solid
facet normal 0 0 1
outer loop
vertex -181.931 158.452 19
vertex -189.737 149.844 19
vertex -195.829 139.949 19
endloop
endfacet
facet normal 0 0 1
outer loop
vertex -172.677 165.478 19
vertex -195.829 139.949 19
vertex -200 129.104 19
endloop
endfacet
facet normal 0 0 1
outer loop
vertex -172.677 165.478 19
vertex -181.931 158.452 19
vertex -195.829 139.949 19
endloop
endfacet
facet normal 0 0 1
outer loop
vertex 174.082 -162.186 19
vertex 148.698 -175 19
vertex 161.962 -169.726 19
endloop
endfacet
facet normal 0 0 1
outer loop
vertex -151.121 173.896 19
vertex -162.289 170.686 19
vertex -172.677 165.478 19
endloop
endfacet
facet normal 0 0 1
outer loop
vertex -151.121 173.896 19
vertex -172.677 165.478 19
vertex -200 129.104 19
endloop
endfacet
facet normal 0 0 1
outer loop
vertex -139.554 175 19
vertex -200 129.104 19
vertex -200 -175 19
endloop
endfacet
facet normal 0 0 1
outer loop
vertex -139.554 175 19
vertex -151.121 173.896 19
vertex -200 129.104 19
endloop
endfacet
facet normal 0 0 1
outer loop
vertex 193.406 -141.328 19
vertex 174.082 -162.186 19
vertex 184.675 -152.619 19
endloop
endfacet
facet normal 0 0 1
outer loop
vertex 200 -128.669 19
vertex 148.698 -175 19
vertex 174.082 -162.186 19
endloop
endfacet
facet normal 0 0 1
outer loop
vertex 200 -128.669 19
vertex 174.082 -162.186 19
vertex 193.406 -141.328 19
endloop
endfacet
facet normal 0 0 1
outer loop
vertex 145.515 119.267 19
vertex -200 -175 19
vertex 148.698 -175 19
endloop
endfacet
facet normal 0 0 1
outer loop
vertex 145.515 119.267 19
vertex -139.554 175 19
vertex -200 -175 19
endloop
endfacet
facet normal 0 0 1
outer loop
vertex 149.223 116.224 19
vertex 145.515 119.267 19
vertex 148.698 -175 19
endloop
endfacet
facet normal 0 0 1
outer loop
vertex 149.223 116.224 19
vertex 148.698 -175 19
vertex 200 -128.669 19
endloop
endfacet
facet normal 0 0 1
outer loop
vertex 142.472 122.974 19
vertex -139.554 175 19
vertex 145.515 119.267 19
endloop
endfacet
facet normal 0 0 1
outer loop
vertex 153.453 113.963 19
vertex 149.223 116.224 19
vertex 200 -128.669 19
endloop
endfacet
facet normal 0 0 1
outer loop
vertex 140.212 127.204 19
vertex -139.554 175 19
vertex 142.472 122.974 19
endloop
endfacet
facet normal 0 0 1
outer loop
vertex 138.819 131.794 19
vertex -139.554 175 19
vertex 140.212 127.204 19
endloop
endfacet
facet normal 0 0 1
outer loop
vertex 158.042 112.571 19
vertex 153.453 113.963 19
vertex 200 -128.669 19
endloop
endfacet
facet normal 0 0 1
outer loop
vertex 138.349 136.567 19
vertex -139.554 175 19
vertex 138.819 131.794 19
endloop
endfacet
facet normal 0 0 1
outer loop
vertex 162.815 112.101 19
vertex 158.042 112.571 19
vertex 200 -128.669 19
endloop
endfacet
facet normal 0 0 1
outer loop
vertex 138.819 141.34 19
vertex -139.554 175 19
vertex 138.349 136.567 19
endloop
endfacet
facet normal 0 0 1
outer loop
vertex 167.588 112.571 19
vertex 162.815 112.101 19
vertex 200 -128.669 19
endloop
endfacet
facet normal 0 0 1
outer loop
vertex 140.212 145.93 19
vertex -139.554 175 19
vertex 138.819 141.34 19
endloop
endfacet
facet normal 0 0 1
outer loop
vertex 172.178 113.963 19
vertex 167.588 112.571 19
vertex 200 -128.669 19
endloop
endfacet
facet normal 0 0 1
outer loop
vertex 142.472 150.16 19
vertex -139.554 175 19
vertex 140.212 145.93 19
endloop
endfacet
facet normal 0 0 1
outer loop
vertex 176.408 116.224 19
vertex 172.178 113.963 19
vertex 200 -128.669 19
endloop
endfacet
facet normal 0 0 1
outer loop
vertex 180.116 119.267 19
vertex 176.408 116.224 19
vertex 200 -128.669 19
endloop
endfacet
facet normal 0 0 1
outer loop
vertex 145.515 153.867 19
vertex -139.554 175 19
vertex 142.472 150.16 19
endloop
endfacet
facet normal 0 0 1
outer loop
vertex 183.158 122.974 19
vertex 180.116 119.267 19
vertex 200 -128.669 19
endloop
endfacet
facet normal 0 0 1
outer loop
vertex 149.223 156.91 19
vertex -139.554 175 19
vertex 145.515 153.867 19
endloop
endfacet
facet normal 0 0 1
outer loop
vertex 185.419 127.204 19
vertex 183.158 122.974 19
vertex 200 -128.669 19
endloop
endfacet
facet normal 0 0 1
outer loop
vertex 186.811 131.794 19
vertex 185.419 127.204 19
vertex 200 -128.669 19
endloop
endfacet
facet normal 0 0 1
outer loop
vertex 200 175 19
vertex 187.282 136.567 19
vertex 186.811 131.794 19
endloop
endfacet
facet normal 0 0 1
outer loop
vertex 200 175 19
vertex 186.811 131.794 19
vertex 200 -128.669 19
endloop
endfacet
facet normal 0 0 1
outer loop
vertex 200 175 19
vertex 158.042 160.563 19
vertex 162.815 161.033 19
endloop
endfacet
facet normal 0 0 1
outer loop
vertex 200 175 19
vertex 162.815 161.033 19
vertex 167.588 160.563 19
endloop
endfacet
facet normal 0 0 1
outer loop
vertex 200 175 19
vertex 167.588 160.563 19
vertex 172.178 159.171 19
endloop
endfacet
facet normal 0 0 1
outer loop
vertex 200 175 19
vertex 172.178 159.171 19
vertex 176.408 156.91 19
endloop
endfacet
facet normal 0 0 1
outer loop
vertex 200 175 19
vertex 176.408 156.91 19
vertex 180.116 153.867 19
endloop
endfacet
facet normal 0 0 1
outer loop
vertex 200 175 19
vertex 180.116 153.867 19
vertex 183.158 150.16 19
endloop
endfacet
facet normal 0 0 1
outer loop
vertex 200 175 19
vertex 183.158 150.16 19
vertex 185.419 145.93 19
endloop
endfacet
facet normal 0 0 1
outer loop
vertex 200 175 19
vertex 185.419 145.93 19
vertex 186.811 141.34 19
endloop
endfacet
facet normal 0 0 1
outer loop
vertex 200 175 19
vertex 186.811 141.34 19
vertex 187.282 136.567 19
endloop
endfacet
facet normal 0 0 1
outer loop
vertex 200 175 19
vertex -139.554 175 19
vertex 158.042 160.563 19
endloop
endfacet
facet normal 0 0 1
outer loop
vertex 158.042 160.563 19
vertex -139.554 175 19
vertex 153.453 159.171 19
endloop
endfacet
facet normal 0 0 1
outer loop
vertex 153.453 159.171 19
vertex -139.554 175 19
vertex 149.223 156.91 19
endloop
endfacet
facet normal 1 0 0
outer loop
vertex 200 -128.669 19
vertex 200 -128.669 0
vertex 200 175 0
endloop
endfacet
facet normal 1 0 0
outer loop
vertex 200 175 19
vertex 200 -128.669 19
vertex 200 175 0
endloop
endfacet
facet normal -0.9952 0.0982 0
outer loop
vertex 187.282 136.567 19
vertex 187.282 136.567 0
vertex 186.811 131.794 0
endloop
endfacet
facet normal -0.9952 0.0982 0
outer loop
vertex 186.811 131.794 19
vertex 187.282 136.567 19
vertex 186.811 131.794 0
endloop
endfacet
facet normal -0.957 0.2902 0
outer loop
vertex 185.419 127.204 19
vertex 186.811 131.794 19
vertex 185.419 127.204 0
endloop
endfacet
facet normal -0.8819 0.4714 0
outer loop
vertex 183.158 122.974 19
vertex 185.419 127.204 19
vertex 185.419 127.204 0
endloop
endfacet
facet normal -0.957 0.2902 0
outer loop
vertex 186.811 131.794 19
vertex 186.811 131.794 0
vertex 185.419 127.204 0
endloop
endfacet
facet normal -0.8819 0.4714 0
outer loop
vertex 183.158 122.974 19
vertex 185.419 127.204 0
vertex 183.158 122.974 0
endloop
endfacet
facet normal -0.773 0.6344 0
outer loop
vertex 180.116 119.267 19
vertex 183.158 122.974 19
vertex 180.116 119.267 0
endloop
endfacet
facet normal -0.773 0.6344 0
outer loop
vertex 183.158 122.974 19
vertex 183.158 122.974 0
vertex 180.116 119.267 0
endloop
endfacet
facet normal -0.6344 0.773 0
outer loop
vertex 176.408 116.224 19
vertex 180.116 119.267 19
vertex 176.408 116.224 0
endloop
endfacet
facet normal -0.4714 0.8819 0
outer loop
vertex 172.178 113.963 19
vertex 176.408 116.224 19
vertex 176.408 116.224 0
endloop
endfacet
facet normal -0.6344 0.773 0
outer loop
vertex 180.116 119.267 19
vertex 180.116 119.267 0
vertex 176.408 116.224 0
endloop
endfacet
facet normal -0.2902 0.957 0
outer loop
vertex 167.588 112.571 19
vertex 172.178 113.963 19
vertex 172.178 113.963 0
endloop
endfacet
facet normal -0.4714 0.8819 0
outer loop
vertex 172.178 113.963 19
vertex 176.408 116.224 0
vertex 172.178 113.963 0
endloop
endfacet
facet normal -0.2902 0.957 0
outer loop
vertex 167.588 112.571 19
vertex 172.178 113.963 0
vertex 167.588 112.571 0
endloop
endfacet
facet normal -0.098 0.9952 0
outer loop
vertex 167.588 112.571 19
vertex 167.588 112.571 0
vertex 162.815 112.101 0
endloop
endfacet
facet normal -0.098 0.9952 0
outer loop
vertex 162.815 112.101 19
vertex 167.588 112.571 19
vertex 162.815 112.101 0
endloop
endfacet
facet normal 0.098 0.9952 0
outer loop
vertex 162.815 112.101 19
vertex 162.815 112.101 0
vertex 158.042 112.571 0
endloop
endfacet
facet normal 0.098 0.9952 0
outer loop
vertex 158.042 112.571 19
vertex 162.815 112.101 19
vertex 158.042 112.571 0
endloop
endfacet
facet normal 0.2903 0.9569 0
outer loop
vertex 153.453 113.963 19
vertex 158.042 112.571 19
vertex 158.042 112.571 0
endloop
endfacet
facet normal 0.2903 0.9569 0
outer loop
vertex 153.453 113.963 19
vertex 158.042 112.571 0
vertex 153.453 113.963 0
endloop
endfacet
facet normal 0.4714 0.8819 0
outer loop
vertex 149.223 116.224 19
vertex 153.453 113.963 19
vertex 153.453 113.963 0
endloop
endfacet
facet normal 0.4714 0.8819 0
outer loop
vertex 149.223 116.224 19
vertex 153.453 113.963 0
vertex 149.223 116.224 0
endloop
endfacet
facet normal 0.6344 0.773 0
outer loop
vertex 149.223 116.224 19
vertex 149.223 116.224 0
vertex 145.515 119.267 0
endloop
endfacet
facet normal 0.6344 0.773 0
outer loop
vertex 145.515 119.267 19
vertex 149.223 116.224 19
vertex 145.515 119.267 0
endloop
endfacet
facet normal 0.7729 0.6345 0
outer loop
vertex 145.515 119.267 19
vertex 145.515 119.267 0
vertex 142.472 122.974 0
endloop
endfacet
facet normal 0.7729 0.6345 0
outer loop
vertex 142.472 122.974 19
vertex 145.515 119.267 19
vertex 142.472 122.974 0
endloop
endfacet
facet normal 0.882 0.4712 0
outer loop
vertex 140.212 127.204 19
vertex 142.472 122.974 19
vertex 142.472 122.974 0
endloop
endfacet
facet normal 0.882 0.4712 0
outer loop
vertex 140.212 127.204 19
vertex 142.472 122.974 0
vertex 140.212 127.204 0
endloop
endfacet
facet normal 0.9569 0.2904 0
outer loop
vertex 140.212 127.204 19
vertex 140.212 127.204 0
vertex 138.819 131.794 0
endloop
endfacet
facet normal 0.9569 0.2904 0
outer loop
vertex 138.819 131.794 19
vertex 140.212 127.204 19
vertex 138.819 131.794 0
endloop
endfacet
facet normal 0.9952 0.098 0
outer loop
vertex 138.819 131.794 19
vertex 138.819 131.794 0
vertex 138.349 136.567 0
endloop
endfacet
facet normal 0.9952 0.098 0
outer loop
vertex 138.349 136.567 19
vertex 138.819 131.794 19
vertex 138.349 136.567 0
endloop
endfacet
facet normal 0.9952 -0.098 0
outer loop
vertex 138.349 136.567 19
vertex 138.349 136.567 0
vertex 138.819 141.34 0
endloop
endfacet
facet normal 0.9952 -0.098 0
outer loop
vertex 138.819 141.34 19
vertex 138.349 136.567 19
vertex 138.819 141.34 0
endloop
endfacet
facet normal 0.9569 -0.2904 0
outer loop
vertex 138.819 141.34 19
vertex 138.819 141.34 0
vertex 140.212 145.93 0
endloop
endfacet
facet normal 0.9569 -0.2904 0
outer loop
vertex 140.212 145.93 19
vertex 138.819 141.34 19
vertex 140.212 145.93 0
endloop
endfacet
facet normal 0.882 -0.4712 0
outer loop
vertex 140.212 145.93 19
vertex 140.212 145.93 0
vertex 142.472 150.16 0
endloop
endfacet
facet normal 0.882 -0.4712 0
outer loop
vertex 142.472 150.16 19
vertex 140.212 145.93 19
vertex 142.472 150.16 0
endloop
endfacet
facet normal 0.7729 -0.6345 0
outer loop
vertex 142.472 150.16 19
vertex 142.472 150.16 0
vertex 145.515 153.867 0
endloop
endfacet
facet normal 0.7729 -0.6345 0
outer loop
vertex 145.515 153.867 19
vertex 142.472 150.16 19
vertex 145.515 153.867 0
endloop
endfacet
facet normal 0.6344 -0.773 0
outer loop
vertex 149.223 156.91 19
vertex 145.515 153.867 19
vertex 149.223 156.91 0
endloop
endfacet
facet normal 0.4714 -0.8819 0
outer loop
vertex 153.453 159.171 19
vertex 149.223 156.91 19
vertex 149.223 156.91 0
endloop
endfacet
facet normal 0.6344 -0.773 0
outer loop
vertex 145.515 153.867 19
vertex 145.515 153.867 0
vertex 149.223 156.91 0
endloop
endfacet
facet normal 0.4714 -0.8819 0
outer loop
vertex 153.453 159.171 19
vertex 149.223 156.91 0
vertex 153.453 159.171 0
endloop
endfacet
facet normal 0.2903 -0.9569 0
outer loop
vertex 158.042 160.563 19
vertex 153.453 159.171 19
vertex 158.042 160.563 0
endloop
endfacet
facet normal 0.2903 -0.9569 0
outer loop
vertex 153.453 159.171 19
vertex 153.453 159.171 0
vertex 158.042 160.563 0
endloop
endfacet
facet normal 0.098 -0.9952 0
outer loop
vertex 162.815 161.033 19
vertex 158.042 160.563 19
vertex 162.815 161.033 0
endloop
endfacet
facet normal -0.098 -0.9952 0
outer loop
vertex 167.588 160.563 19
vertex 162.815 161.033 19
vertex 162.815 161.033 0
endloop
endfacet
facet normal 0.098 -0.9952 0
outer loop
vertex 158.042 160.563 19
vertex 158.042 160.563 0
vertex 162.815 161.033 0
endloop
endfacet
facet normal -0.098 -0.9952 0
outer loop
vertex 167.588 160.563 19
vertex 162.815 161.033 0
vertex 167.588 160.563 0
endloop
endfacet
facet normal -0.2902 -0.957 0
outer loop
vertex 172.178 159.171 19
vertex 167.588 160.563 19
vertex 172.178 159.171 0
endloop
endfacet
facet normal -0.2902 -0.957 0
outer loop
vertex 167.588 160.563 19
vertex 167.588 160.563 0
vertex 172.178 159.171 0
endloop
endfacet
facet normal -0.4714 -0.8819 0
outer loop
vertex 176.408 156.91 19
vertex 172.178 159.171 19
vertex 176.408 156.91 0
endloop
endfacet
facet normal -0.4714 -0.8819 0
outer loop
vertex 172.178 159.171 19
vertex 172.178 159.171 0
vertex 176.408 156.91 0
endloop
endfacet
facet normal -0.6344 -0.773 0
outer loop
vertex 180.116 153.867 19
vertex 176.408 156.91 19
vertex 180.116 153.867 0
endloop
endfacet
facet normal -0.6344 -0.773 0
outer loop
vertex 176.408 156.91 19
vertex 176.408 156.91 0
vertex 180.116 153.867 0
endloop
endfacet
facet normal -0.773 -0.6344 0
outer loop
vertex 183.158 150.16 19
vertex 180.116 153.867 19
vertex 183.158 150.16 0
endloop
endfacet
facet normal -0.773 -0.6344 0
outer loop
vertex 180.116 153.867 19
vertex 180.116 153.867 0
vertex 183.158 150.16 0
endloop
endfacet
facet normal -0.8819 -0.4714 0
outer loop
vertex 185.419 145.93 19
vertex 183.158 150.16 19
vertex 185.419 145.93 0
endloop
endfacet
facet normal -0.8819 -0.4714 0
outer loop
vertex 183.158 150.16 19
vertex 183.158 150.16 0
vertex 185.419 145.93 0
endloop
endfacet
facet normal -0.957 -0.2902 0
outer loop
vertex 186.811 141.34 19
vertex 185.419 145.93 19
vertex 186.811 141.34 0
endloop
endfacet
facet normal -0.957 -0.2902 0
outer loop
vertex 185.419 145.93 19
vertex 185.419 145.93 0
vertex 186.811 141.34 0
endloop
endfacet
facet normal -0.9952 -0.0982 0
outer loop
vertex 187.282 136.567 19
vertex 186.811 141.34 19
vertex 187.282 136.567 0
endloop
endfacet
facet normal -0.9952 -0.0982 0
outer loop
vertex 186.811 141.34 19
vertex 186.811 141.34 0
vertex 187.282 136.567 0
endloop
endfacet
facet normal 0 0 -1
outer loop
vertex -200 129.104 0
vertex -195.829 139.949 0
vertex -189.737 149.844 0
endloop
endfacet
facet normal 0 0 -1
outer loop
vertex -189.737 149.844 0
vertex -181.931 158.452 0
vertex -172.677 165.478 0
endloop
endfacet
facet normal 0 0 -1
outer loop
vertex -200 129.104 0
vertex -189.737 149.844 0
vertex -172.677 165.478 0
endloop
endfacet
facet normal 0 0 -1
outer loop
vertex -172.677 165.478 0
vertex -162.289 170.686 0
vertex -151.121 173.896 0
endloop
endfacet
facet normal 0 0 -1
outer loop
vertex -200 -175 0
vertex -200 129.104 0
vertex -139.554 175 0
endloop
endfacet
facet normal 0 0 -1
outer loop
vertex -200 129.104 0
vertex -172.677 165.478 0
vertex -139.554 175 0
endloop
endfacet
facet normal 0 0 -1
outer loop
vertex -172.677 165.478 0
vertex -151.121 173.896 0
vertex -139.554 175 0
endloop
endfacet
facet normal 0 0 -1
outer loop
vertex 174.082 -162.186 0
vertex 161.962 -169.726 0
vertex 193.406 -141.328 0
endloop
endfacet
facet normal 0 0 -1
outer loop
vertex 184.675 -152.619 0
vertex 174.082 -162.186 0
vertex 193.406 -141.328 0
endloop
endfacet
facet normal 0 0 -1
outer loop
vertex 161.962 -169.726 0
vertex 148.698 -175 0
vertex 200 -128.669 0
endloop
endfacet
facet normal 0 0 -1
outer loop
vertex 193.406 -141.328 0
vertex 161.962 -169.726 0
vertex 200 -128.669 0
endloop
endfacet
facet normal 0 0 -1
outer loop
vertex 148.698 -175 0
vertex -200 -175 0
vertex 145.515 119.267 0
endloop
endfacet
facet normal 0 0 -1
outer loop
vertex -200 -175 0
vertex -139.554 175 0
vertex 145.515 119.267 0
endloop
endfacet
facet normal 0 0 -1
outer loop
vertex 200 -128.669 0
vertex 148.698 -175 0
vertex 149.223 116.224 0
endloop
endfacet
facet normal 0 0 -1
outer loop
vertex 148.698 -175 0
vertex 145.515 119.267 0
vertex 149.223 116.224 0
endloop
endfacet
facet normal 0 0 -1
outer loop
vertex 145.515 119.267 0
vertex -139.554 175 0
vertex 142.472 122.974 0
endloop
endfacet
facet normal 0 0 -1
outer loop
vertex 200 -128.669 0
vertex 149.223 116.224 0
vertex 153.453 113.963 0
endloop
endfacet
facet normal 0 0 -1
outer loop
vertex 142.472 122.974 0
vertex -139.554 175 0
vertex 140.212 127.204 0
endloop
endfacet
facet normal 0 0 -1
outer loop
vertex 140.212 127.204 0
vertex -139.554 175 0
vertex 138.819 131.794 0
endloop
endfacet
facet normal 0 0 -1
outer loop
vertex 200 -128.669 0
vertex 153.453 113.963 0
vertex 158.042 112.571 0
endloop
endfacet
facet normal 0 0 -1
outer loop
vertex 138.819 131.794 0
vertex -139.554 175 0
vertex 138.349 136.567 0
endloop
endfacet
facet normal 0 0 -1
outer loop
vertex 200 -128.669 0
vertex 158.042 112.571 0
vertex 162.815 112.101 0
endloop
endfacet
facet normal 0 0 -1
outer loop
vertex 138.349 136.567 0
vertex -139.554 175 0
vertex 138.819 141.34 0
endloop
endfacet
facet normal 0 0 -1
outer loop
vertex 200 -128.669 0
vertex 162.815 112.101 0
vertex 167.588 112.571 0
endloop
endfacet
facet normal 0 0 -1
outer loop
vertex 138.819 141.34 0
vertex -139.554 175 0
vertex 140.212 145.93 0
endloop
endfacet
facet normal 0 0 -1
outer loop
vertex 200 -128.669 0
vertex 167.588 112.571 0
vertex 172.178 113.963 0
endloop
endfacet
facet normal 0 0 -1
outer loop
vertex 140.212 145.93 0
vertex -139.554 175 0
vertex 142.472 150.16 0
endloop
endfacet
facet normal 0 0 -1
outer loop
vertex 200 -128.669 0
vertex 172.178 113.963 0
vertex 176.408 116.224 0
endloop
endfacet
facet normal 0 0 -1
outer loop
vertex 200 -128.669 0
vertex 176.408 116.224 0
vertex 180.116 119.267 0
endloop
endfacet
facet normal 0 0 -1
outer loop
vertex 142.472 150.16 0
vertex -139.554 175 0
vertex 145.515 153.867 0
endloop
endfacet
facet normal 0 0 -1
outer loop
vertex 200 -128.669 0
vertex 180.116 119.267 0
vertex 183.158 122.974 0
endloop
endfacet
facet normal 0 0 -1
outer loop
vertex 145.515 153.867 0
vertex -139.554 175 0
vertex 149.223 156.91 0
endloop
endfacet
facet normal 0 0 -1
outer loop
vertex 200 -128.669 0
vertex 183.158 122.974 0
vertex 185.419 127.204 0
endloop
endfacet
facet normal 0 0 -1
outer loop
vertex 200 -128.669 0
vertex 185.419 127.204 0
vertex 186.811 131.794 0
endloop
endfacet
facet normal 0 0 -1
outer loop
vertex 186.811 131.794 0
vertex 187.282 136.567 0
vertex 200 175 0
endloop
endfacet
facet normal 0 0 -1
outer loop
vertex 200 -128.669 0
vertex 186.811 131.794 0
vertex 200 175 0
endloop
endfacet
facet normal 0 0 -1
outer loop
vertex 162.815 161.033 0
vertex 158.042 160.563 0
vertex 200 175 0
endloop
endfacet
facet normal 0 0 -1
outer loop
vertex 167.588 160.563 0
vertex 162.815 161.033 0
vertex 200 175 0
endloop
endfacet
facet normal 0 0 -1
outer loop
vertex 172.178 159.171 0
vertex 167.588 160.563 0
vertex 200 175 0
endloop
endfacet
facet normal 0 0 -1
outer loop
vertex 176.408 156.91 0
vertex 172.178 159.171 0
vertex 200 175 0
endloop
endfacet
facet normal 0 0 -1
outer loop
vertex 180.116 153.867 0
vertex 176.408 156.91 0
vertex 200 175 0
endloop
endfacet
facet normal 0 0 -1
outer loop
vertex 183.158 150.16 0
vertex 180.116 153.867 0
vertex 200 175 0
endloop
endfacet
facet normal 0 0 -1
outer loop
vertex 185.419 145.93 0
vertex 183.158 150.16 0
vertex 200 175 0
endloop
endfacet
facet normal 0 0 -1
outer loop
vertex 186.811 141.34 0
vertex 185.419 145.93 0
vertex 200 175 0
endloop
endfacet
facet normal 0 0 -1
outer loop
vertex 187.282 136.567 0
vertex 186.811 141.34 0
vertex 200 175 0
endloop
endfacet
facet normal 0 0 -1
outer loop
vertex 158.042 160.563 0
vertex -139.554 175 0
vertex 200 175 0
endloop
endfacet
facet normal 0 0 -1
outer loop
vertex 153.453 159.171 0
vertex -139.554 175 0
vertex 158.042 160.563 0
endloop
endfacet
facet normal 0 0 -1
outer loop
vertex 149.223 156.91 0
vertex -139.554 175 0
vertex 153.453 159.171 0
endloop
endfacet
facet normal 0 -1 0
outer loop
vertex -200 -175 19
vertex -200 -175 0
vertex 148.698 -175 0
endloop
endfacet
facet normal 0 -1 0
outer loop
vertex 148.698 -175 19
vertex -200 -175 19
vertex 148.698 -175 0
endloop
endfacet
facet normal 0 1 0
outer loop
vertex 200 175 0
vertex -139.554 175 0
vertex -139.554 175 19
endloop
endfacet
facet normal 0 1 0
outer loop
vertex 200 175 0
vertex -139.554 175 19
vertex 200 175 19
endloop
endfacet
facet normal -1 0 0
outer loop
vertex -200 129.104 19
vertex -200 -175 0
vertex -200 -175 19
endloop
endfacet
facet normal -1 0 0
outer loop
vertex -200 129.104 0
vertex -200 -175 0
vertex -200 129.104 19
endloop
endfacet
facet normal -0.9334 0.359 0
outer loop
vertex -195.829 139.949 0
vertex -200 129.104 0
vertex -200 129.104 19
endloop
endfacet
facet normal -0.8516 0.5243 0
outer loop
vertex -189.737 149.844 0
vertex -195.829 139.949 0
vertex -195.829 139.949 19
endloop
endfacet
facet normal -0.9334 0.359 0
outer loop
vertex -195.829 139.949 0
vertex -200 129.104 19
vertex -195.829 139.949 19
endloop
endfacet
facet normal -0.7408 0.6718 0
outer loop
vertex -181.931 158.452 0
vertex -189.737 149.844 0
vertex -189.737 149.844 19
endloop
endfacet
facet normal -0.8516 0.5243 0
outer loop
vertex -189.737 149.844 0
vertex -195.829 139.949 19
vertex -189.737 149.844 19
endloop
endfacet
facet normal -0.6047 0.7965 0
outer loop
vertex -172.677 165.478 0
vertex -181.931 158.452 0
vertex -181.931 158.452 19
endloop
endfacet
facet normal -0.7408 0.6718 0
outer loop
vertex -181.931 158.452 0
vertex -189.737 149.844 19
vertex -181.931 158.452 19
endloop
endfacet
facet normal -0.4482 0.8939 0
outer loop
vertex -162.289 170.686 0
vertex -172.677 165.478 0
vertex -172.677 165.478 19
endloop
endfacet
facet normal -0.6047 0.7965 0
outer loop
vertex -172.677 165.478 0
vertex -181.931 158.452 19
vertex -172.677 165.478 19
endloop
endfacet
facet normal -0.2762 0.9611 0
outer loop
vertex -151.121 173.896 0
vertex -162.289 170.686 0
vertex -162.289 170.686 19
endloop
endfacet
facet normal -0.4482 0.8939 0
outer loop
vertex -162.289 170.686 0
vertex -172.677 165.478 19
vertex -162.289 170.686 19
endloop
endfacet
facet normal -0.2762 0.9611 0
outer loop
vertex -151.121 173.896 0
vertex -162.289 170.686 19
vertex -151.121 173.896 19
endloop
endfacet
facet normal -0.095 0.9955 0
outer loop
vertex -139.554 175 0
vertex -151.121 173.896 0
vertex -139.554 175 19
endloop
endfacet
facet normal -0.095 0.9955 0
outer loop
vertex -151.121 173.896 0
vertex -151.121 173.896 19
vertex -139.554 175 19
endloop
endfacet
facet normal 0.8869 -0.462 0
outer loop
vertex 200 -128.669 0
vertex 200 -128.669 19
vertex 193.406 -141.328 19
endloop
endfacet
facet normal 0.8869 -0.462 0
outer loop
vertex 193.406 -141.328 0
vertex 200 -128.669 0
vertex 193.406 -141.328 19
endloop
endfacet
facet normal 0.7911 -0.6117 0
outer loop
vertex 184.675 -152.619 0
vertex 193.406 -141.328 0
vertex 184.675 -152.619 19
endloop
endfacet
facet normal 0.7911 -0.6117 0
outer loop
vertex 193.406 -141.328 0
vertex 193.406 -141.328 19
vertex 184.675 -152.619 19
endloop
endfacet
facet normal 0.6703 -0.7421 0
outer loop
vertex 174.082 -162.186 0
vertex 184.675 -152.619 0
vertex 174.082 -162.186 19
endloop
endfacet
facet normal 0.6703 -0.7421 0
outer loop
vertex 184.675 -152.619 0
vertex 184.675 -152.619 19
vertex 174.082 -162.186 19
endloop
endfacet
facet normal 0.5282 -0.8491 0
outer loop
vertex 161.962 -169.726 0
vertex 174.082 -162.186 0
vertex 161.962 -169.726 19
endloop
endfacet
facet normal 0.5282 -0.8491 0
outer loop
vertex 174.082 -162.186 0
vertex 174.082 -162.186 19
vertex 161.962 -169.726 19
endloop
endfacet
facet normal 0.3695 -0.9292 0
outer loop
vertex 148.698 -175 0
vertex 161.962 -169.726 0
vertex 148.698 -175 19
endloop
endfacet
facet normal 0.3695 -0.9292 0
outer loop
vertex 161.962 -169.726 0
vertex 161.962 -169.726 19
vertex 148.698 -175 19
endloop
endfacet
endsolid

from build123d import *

# Parameters (mm, degrees)
F0_W     = 400
F0_H     = 350
F1_DEPTH = 19
F3_DEPTH = 19.001
F5_DEPTH = 19.001
F6_R     = 24.466171
F7_DEPTH = 19.001


with BuildPart() as f1:
    # F0 (on Top) → F1 (new body)
    with BuildSketch(Plane.XY):
        Rectangle(F0_W, F0_H)
    extrude(amount=F1_DEPTH)

    # F2 (on face) → F3 (cut, through all)
    with BuildSketch(Plane.XY.offset(19)):
        with BuildLine():
            ThreePointArc((-200, 129.103959), (-177.466349, 162.178838), (-139.554203, 175))
            Line((-139.554203, 175), (-200, 175))
            Line((-200, 175), (-200, 129.103959))
        make_face()
    extrude(amount=-F3_DEPTH, mode=Mode.SUBTRACT)

    # F4 (on face) → F5 (cut, through all)
    with BuildSketch(Plane.XY.offset(19)):
        with BuildLine():
            ThreePointArc((200, -128.668547), (179.591152, -157.638715), (148.698151, -175))
            Line((148.698151, -175), (200, -175))
            Line((200, -175), (200, -128.668547))
        make_face()
    extrude(amount=-F5_DEPTH, mode=Mode.SUBTRACT)

    # F6 (on face) → F7 (cut, through all)
    with BuildSketch(Plane(origin=(0, 0, 0), x_dir=(1, 0, 0), z_dir=(0, 0, -1))):
        with Locations((162.81534, -136.567061)):
            Circle(F6_R)
    extrude(amount=-F7_DEPTH, mode=Mode.SUBTRACT)


solid = f1.part
